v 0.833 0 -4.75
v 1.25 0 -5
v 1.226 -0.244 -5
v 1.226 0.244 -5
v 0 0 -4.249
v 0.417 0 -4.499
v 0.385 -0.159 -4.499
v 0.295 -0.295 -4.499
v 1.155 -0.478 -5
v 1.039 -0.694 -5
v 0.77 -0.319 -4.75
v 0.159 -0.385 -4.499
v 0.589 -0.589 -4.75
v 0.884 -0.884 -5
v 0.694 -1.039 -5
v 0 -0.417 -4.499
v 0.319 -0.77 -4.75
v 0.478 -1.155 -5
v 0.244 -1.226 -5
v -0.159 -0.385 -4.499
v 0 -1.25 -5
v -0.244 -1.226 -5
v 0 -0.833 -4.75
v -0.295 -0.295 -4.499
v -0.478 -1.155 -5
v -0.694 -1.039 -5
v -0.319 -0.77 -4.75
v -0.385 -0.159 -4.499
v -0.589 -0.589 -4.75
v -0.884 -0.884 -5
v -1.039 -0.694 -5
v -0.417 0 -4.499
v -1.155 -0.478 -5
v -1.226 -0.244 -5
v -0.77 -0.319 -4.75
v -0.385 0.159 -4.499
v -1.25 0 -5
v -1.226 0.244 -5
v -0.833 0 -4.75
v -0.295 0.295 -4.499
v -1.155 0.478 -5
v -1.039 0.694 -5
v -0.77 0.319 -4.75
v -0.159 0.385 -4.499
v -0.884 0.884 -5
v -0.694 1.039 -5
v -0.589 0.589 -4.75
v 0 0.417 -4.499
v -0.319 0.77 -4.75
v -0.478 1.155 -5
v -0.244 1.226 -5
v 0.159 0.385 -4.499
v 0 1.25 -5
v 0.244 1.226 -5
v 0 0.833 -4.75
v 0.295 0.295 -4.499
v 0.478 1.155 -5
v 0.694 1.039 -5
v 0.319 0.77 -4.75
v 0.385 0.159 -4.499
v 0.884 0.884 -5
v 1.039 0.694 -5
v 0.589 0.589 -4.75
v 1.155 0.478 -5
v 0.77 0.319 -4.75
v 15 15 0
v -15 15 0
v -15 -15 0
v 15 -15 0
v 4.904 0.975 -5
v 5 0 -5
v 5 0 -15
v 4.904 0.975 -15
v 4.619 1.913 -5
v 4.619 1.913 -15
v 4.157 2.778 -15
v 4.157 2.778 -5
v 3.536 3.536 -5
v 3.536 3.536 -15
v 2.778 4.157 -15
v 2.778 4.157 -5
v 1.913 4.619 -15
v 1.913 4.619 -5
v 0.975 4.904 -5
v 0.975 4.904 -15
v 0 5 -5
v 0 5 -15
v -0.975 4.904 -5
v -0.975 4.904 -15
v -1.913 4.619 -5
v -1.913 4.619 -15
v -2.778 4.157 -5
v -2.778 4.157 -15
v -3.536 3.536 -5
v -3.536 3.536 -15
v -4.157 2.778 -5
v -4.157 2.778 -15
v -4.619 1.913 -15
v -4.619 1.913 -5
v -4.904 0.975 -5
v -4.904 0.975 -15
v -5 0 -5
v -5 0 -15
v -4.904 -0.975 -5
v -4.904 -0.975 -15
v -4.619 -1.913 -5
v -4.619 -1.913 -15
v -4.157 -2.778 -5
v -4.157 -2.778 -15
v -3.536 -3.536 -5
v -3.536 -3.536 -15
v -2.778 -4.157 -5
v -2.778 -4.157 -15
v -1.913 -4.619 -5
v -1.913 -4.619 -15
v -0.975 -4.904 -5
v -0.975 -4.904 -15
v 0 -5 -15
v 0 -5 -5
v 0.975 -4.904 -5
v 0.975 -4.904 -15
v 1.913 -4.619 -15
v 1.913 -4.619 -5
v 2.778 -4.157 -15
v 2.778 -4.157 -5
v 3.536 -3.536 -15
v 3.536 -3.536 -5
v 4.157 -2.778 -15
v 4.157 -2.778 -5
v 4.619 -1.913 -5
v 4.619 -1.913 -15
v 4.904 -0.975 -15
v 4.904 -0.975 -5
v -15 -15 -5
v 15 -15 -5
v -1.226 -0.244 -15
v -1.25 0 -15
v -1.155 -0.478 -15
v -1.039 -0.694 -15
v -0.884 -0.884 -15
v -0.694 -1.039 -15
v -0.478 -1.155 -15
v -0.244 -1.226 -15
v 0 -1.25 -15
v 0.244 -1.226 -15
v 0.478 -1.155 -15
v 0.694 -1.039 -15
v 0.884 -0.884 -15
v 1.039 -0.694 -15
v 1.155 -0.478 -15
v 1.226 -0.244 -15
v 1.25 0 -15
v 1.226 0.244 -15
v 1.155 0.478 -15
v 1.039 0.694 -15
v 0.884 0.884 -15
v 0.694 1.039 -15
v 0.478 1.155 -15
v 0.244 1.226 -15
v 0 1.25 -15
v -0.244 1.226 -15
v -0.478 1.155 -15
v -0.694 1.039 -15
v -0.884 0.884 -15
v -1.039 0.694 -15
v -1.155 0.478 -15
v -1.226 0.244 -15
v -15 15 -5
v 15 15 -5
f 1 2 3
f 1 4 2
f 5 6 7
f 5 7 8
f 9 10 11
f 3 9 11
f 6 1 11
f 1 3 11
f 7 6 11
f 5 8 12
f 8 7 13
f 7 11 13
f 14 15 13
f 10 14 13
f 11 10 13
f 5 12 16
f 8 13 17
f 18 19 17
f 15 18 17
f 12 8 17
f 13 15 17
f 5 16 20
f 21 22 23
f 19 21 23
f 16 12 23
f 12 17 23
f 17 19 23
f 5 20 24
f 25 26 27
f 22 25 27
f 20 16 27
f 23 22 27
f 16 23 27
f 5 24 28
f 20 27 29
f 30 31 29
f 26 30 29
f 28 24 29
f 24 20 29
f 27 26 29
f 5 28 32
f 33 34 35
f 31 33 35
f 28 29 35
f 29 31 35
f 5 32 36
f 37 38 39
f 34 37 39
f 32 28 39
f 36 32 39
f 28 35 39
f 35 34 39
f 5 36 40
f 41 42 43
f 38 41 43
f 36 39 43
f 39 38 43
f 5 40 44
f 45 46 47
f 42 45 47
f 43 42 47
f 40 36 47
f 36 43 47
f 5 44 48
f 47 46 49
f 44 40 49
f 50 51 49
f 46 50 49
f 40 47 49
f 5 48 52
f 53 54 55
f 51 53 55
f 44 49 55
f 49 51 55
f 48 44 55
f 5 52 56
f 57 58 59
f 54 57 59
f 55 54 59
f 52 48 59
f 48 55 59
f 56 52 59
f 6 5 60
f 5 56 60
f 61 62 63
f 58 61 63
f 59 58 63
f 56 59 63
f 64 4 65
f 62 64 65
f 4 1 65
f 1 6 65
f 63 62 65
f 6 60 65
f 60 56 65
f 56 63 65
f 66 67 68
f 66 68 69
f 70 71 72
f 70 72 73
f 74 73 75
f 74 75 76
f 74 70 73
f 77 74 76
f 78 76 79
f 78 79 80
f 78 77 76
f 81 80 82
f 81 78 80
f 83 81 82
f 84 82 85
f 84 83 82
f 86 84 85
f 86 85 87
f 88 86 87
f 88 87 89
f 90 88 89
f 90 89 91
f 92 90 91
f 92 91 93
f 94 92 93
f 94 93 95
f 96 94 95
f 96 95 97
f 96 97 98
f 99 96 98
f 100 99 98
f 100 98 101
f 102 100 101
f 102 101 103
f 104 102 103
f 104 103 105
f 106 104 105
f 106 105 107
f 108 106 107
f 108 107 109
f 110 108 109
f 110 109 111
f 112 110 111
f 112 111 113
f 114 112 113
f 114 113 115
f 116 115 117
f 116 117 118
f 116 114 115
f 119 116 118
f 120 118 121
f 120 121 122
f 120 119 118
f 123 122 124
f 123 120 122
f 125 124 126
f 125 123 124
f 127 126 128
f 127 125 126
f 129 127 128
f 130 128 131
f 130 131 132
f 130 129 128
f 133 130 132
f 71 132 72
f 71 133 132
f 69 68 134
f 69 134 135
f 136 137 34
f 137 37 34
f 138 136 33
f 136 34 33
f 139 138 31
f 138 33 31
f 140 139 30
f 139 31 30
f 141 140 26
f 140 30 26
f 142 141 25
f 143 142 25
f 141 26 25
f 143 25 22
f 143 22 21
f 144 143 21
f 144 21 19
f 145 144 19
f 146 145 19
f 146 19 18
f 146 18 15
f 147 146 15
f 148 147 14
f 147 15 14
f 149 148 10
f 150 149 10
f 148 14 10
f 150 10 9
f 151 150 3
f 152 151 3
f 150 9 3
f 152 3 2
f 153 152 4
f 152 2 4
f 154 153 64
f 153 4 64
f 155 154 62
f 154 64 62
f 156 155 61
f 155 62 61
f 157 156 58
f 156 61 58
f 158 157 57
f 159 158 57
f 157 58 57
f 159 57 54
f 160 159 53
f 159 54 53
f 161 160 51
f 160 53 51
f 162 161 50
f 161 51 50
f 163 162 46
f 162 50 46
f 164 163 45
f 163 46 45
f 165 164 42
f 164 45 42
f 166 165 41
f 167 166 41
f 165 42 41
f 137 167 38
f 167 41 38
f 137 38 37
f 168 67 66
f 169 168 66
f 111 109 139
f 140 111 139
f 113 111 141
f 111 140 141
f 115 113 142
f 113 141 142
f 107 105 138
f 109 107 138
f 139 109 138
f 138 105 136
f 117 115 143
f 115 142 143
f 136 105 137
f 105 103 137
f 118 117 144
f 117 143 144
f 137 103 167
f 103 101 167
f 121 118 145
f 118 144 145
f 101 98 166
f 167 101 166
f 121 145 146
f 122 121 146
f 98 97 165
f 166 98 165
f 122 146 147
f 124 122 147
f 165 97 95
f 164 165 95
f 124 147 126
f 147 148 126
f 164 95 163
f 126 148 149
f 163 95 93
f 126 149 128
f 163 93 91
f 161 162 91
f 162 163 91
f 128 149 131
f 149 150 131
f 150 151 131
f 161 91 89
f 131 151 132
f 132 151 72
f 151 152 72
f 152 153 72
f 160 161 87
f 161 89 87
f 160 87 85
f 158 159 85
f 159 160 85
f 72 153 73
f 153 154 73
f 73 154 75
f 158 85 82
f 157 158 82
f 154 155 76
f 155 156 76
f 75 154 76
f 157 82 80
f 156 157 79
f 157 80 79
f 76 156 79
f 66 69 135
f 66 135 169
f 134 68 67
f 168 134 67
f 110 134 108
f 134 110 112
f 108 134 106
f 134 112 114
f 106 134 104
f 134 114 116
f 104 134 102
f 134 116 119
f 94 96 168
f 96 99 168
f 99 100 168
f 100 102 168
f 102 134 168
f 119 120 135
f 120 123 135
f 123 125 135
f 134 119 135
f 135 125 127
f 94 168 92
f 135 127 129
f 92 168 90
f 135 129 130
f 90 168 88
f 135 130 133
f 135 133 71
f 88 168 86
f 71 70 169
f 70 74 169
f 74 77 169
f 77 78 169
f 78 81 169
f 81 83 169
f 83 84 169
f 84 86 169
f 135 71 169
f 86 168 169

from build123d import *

# Parameters (mm, degrees)
F0_R     = 5
F1_DEPTH = 15
F0_W     = 30
F0_H     = 30
F2_DEPTH = 5
F4_D     = 2.5
F4_DEPTH = 10
F4_TIP   = 0.7510757738


with BuildPart() as f1:
    # F0 (on Top) → F1 (new body)
    with BuildSketch(Plane.XY):
        Circle(F0_R)
    extrude(amount=-F1_DEPTH)

    # F0 (on Top) → F2 (join)
    with BuildSketch(Plane.XY):
        Rectangle(F0_W, F0_H)
        Circle(F0_R, mode=Mode.SUBTRACT)
    extrude(amount=-F2_DEPTH)

    # F4
    with Locations(Plane(origin=(0, 0, -15), x_dir=(1, 0, 0), z_dir=(0, 0, -1))):
        with Locations((0, 0)):
            Hole(F4_D / 2, depth=F4_DEPTH)
            with Locations((0, 0, -(F4_DEPTH + F4_TIP / 2))):  # 118° drill point
                Cone(0, F4_D / 2, F4_TIP, mode=Mode.SUBTRACT)


solid = f1.part
